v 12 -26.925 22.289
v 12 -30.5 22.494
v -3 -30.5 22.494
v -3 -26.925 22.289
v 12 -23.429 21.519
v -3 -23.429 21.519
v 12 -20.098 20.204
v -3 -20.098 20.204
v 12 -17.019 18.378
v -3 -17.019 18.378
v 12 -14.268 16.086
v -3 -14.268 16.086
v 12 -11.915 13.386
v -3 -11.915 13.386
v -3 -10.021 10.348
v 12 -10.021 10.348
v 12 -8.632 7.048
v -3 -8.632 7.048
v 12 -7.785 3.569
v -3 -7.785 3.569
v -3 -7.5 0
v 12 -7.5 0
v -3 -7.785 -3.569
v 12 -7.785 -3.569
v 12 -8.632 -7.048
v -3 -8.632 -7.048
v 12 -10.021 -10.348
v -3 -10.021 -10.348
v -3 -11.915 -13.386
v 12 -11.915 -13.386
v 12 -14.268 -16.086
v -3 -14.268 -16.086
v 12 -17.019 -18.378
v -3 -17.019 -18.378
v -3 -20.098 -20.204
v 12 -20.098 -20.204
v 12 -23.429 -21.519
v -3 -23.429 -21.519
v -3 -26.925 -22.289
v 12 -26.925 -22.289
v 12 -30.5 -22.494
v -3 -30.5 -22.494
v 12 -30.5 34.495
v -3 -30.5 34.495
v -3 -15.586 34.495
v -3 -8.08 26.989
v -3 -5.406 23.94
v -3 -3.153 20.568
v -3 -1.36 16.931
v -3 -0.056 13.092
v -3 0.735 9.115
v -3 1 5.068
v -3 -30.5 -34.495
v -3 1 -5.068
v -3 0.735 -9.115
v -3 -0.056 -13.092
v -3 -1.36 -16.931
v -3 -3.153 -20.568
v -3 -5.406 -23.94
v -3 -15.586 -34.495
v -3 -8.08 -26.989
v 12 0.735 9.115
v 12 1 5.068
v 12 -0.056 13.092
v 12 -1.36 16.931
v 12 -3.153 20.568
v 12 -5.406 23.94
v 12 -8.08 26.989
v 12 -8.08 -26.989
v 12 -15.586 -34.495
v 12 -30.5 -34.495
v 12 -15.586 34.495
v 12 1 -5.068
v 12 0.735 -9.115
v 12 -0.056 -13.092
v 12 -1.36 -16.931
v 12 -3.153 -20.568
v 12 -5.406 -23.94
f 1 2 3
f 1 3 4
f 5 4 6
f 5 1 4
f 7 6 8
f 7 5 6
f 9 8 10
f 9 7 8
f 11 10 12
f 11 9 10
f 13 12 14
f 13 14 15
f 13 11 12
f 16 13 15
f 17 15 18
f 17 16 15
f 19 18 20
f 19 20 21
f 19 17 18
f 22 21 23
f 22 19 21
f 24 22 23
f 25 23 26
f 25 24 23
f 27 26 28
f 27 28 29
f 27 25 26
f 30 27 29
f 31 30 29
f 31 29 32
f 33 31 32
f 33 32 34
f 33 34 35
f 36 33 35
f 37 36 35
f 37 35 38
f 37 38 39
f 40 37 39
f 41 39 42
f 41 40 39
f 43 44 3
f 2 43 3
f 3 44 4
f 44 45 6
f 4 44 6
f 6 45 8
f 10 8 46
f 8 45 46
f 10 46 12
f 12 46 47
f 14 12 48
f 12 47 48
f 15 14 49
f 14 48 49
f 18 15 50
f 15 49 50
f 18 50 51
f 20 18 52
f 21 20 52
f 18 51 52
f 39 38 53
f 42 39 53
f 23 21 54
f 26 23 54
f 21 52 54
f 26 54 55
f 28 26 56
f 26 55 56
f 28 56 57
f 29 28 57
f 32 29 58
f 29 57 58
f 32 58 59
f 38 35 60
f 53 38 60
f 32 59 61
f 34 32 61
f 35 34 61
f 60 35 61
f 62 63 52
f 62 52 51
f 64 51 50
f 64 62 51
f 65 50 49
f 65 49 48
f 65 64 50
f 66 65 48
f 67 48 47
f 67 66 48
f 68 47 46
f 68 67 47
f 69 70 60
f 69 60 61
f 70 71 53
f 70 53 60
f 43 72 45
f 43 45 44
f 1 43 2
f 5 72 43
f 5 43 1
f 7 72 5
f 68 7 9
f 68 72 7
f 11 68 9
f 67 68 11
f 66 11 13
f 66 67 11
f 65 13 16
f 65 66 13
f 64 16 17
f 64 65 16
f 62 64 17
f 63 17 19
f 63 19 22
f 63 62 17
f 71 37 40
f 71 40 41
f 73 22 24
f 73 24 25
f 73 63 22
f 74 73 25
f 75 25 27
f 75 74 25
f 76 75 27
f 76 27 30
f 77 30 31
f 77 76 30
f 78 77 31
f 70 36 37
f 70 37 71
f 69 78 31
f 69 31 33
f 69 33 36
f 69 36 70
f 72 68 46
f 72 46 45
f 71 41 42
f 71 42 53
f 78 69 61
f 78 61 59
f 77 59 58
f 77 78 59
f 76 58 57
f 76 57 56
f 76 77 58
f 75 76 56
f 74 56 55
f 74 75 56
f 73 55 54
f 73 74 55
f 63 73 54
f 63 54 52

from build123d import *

# Parameters (mm, degrees)
BOSS_EXTRUDE1_DEPTH = 12
CHAMFER1_SIZE       = 16
FILLET1_R           = 30
BOSS_EXTRUDE3_DEPTH = 15


with BuildPart() as part:
    # Sketch1 → Boss-Extrude1 (new body)
    with BuildSketch(Plane(origin=(0, 0, 0), x_dir=(0, 0, -1), z_dir=(1, 0, 0))):
        with BuildLine():
            Line((-33.494680249, 0), (33.494680249, 0))
            Line((33.494680249, 0), (33.494680249, -29.5))
            Line((33.494680249, -29.5), (23.494680249, -29.5))
            ThreePointArc((23.494680249, -29.5), (0, -6.5), (-23.494680249, -29.5))
            Line((-23.494680249, -29.5), (-33.494680249, -29.5))
            Line((-33.494680249, -29.5), (-33.494680249, 0))
        make_face()
    extrude(amount=BOSS_EXTRUDE1_DEPTH)

    # Chamfer1
    chamfer1_edges = [part.edges().sort_by_distance(p)[0] for p in [
        (6, 0, 33.494680249),
        (6, 0, -33.494680249),
    ]]
    chamfer(chamfer1_edges, length=CHAMFER1_SIZE)

    # Fillet1
    fillet1_edges = [part.edges().sort_by_distance(p)[0] for p in [
        (6, 0, 17.494680249),
        (6, 0, -17.494680249),
    ]]
    fillet(fillet1_edges, radius=FILLET1_R)

    # Sketch6 → Boss-Extrude3 (add)
    with BuildSketch(Plane(origin=(12, 0, 0), x_dir=(0, 0, -1), z_dir=(1, 0, 0))):
        with BuildLine():
            Line((34.494680249, -15.585786438), (26.988583595, -8.079689783))
            ThreePointArc((26.988583595, -8.079689783), (16.931459781, -1.359734492), (5.068273378, 1))
            Line((5.068273378, 1), (-5.068273378, 1))
            ThreePointArc((-5.068273378, 1), (-16.931459781, -1.359734492), (-26.988583595, -8.079689783))
            Line((-26.988583595, -8.079689783), (-34.494680249, -15.585786438))
            Line((-34.494680249, -15.585786438), (-34.494680249, -30.5))
            Line((-34.494680249, -30.5), (-22.494443758, -30.5))
            ThreePointArc((-22.494443758, -30.5), (0, -7.5), (22.494443758, -30.5))
            Line((22.494443758, -30.5), (34.494680249, -30.5))
            Line((34.494680249, -30.5), (34.494680249, -15.585786438))
        make_face()
    extrude(amount=-BOSS_EXTRUDE3_DEPTH)


solid = part.part
